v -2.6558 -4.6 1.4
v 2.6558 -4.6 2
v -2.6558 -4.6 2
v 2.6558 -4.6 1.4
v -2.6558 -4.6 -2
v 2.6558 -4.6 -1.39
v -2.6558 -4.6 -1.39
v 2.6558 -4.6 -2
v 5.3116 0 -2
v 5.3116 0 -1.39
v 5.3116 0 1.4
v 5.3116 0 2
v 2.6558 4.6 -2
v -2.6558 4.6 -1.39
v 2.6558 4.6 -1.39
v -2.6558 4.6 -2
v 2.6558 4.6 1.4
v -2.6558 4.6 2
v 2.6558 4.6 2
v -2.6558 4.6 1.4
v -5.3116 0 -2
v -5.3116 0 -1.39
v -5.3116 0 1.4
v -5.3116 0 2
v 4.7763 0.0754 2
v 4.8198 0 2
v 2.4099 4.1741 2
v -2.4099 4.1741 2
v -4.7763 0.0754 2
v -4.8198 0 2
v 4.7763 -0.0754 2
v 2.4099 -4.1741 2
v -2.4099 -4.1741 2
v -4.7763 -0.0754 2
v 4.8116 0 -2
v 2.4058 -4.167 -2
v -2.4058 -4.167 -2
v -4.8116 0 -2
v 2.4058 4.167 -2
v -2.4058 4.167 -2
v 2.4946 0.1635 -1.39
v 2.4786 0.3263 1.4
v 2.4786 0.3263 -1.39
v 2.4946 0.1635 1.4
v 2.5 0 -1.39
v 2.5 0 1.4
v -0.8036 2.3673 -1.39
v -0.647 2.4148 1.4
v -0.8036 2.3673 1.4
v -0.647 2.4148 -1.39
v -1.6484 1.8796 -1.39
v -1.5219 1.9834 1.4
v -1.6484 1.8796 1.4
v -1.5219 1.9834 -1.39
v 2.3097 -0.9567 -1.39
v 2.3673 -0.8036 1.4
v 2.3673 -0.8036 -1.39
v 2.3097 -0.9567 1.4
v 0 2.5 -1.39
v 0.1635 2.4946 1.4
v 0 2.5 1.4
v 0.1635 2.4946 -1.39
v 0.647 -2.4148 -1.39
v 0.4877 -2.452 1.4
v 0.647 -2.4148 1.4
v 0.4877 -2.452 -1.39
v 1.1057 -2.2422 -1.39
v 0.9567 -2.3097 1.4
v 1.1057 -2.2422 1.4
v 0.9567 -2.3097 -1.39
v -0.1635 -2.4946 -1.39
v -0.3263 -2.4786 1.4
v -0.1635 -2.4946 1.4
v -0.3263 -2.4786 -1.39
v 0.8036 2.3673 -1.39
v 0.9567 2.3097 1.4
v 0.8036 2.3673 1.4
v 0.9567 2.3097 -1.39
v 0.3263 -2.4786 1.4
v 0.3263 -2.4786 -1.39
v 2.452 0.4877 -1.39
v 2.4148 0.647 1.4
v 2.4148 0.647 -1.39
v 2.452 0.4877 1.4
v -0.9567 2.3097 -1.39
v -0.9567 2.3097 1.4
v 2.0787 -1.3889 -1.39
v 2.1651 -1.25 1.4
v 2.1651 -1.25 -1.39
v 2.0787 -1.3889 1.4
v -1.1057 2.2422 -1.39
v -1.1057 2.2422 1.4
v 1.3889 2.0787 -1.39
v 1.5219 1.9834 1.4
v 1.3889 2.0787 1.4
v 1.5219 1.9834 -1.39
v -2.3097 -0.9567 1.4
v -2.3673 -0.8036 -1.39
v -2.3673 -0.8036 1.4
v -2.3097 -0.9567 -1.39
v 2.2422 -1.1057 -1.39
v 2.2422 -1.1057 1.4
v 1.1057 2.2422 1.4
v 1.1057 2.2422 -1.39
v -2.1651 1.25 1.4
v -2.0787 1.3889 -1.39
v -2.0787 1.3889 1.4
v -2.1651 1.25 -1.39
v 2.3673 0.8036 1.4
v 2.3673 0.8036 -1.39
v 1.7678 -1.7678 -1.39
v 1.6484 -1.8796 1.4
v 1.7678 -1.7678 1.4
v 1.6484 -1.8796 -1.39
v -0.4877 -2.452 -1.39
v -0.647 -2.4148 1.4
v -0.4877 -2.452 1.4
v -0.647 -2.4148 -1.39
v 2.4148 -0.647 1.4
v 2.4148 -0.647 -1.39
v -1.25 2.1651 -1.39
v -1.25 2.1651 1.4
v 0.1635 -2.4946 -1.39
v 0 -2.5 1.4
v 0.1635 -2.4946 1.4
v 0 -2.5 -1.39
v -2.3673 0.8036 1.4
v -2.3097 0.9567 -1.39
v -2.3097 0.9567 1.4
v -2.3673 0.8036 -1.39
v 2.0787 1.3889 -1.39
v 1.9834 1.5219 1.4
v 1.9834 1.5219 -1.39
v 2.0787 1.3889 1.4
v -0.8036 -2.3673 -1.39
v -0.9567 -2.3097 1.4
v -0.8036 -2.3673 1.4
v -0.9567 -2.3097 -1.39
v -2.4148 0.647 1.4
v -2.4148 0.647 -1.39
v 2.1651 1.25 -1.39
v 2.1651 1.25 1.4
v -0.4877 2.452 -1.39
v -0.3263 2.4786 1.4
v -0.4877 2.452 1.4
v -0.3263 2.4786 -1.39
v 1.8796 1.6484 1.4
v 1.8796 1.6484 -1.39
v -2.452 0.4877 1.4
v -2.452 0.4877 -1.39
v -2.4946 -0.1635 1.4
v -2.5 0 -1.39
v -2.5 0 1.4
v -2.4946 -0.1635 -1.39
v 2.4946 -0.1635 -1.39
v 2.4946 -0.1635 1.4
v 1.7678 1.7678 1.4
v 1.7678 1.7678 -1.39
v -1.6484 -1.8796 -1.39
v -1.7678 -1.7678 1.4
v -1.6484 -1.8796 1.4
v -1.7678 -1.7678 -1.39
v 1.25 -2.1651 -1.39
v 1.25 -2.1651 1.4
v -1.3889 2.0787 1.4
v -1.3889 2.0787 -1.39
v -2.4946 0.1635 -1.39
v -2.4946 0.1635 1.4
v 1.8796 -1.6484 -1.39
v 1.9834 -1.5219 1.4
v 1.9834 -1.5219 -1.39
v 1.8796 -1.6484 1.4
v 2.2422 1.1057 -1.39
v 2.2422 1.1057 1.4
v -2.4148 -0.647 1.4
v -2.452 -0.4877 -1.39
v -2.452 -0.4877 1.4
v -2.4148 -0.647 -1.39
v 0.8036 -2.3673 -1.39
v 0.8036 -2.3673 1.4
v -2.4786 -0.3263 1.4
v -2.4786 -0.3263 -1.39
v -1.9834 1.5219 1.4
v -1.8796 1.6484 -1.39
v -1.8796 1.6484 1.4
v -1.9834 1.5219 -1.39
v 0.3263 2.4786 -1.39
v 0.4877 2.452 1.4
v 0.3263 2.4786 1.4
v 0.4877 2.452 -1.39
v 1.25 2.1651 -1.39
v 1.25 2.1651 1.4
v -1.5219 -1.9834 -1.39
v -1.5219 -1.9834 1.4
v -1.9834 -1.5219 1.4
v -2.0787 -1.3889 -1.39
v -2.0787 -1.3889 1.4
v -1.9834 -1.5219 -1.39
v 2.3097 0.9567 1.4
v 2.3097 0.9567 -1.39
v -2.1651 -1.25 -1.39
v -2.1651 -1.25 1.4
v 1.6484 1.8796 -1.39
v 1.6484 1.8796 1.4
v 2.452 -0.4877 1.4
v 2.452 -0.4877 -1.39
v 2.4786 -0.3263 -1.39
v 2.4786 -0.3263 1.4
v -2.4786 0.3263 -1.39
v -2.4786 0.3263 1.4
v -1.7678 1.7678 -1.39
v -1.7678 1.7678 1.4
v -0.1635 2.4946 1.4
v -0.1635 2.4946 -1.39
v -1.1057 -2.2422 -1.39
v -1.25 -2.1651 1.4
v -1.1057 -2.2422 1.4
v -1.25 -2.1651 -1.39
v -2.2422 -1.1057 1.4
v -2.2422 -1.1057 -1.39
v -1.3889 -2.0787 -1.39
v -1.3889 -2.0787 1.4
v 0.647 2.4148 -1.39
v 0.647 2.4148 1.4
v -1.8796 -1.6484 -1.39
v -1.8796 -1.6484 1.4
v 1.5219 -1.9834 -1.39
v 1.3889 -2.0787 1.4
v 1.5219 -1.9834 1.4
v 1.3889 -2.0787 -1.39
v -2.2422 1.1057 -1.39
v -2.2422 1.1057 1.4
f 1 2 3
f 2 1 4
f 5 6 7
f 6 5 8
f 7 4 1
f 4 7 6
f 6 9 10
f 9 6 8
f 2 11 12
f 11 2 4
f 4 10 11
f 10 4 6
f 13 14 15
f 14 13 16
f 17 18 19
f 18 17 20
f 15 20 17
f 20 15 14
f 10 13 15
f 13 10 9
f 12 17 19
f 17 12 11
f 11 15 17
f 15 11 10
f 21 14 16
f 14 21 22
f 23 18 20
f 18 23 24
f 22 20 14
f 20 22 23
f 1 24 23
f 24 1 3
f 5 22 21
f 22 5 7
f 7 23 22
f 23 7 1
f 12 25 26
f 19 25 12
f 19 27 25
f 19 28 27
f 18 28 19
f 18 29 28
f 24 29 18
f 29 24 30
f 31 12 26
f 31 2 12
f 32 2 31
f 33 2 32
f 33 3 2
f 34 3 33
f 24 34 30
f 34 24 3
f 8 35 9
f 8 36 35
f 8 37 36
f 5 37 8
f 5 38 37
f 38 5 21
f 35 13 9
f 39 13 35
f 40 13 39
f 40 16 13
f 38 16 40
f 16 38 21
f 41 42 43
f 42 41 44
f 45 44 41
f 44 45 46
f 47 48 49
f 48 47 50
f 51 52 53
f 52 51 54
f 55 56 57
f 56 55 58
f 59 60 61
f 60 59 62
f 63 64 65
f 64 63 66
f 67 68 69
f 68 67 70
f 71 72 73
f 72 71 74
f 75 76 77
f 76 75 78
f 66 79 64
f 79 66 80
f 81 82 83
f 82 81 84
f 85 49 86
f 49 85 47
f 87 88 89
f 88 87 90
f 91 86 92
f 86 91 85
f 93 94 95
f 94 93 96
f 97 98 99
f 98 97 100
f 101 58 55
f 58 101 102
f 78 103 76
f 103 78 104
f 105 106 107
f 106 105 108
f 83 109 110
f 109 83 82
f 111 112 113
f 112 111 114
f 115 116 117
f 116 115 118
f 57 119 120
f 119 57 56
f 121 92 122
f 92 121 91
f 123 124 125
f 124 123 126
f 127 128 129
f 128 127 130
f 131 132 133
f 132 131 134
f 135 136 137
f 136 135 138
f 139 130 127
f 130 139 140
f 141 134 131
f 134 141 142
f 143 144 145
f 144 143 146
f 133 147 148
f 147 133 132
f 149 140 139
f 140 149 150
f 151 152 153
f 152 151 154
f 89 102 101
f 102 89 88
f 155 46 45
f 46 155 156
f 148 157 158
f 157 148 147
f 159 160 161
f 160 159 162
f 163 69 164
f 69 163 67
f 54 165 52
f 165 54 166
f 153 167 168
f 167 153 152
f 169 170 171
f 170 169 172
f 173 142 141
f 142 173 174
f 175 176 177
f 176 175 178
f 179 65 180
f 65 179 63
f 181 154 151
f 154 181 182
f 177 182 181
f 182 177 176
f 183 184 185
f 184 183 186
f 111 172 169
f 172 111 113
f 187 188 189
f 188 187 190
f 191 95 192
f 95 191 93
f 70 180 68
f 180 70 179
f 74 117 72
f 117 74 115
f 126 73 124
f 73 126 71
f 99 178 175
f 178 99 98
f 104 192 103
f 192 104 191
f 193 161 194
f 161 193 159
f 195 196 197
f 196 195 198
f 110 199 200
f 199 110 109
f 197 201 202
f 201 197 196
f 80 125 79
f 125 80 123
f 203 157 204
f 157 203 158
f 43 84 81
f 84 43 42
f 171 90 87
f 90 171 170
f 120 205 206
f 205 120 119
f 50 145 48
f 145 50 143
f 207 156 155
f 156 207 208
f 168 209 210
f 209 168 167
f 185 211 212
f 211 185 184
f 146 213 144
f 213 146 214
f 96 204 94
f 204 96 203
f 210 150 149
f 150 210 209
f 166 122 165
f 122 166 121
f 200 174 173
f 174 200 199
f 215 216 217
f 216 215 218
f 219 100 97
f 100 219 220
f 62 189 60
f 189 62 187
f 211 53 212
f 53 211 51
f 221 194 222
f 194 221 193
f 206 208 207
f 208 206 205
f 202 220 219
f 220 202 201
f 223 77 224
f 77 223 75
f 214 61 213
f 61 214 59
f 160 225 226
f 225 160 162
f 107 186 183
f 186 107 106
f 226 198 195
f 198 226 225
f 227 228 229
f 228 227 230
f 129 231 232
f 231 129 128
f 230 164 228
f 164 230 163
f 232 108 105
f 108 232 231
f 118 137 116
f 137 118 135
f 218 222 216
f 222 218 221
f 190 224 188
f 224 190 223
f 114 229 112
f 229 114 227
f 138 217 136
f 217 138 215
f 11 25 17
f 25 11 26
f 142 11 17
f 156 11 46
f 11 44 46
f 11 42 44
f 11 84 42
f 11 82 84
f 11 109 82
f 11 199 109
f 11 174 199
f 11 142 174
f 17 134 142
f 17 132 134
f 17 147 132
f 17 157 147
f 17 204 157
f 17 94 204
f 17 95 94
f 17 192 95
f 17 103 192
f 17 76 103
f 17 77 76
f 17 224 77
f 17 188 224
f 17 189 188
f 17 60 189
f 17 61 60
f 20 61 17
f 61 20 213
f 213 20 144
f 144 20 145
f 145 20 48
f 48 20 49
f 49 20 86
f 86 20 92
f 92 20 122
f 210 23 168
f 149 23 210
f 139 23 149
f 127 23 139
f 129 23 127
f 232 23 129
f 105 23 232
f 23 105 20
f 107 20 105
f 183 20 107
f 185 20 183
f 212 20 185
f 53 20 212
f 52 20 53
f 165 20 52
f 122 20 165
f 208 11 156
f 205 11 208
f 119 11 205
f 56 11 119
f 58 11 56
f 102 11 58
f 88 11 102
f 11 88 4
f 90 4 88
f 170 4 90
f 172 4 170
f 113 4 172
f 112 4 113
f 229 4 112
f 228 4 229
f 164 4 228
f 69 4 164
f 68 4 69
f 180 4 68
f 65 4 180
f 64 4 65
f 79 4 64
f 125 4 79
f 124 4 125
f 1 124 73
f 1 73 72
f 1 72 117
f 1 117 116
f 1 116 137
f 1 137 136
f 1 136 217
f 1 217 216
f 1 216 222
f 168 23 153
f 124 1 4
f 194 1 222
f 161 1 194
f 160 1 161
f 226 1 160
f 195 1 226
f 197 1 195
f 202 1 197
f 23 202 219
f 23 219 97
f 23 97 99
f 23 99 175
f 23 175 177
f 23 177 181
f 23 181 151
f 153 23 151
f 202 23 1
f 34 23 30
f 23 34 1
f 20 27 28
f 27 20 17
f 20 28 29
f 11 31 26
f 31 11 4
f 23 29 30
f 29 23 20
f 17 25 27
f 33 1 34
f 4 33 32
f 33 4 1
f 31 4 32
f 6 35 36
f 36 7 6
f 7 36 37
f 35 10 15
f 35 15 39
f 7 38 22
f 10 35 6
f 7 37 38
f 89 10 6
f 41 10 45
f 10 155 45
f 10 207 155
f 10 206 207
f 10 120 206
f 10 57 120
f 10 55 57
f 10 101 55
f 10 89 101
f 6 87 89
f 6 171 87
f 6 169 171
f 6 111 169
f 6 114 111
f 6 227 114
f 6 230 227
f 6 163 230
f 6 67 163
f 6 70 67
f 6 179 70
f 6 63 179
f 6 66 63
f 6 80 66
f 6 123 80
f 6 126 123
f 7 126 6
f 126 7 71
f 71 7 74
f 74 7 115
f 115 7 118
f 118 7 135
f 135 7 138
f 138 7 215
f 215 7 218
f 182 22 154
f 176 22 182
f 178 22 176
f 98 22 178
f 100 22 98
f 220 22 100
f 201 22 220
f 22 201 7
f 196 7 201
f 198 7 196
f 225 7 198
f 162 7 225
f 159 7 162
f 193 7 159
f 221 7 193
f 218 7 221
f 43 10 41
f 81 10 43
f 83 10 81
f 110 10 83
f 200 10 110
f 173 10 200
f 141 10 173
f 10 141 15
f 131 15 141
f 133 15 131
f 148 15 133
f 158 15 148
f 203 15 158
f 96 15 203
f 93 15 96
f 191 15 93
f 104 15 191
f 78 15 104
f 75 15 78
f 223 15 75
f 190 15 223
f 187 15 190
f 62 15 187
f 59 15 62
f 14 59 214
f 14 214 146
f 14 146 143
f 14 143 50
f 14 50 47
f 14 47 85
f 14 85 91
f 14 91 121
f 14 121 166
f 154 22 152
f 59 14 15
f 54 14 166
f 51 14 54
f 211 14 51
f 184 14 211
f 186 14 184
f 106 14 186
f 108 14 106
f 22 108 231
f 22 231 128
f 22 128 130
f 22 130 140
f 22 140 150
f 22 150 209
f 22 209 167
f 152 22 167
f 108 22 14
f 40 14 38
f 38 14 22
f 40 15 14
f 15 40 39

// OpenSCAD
$fn = 96;

// Target dimensions
af = 9.2;          // across flats (mm)
thickness = 4.0;   // nut thickness (mm)
hole_d = 5.0;      // through-hole diameter (mm)

// Derived
R = af / sqrt(3);  // circumradius for a true hex with given across-flats
chamfer_h = 0.6;   // small edge chamfer height (mm)
chamfer_inset = 0.5; // radial inset for chamfer (mm)

module hex_prism(h, r) {
    cylinder(h=h, r=r, $fn=6, center=true);
}

module hex_nut() {
    difference() {
        // One connected solid: union of main body + chamfered rims
        union() {
            // Main hex body
            hex_prism(thickness, R);

            // Top chamfer ring (overlaps into body)
            translate([0, 0, thickness/2 - chamfer_h/2])
                hex_prism(chamfer_h, R);

            // Bottom chamfer ring (overlaps into body)
            translate([0, 0, -thickness/2 + chamfer_h/2])
                hex_prism(chamfer_h, R);
        }

        // Through-hole (slightly extended to guarantee cut)
        cylinder(h=thickness + 2, d=hole_d, center=true);

        // Chamfer cuts (top and bottom), kept connected via difference
        translate([0, 0, thickness/2 - chamfer_h])
            cylinder(h=chamfer_h + 0.01, r1=R, r2=R - chamfer_inset, $fn=6, center=false);

        translate([0, 0, -thickness/2])
            cylinder(h=chamfer_h + 0.01, r1=R - chamfer_inset, r2=R, $fn=6, center=false);
    }
}

hex_nut();
